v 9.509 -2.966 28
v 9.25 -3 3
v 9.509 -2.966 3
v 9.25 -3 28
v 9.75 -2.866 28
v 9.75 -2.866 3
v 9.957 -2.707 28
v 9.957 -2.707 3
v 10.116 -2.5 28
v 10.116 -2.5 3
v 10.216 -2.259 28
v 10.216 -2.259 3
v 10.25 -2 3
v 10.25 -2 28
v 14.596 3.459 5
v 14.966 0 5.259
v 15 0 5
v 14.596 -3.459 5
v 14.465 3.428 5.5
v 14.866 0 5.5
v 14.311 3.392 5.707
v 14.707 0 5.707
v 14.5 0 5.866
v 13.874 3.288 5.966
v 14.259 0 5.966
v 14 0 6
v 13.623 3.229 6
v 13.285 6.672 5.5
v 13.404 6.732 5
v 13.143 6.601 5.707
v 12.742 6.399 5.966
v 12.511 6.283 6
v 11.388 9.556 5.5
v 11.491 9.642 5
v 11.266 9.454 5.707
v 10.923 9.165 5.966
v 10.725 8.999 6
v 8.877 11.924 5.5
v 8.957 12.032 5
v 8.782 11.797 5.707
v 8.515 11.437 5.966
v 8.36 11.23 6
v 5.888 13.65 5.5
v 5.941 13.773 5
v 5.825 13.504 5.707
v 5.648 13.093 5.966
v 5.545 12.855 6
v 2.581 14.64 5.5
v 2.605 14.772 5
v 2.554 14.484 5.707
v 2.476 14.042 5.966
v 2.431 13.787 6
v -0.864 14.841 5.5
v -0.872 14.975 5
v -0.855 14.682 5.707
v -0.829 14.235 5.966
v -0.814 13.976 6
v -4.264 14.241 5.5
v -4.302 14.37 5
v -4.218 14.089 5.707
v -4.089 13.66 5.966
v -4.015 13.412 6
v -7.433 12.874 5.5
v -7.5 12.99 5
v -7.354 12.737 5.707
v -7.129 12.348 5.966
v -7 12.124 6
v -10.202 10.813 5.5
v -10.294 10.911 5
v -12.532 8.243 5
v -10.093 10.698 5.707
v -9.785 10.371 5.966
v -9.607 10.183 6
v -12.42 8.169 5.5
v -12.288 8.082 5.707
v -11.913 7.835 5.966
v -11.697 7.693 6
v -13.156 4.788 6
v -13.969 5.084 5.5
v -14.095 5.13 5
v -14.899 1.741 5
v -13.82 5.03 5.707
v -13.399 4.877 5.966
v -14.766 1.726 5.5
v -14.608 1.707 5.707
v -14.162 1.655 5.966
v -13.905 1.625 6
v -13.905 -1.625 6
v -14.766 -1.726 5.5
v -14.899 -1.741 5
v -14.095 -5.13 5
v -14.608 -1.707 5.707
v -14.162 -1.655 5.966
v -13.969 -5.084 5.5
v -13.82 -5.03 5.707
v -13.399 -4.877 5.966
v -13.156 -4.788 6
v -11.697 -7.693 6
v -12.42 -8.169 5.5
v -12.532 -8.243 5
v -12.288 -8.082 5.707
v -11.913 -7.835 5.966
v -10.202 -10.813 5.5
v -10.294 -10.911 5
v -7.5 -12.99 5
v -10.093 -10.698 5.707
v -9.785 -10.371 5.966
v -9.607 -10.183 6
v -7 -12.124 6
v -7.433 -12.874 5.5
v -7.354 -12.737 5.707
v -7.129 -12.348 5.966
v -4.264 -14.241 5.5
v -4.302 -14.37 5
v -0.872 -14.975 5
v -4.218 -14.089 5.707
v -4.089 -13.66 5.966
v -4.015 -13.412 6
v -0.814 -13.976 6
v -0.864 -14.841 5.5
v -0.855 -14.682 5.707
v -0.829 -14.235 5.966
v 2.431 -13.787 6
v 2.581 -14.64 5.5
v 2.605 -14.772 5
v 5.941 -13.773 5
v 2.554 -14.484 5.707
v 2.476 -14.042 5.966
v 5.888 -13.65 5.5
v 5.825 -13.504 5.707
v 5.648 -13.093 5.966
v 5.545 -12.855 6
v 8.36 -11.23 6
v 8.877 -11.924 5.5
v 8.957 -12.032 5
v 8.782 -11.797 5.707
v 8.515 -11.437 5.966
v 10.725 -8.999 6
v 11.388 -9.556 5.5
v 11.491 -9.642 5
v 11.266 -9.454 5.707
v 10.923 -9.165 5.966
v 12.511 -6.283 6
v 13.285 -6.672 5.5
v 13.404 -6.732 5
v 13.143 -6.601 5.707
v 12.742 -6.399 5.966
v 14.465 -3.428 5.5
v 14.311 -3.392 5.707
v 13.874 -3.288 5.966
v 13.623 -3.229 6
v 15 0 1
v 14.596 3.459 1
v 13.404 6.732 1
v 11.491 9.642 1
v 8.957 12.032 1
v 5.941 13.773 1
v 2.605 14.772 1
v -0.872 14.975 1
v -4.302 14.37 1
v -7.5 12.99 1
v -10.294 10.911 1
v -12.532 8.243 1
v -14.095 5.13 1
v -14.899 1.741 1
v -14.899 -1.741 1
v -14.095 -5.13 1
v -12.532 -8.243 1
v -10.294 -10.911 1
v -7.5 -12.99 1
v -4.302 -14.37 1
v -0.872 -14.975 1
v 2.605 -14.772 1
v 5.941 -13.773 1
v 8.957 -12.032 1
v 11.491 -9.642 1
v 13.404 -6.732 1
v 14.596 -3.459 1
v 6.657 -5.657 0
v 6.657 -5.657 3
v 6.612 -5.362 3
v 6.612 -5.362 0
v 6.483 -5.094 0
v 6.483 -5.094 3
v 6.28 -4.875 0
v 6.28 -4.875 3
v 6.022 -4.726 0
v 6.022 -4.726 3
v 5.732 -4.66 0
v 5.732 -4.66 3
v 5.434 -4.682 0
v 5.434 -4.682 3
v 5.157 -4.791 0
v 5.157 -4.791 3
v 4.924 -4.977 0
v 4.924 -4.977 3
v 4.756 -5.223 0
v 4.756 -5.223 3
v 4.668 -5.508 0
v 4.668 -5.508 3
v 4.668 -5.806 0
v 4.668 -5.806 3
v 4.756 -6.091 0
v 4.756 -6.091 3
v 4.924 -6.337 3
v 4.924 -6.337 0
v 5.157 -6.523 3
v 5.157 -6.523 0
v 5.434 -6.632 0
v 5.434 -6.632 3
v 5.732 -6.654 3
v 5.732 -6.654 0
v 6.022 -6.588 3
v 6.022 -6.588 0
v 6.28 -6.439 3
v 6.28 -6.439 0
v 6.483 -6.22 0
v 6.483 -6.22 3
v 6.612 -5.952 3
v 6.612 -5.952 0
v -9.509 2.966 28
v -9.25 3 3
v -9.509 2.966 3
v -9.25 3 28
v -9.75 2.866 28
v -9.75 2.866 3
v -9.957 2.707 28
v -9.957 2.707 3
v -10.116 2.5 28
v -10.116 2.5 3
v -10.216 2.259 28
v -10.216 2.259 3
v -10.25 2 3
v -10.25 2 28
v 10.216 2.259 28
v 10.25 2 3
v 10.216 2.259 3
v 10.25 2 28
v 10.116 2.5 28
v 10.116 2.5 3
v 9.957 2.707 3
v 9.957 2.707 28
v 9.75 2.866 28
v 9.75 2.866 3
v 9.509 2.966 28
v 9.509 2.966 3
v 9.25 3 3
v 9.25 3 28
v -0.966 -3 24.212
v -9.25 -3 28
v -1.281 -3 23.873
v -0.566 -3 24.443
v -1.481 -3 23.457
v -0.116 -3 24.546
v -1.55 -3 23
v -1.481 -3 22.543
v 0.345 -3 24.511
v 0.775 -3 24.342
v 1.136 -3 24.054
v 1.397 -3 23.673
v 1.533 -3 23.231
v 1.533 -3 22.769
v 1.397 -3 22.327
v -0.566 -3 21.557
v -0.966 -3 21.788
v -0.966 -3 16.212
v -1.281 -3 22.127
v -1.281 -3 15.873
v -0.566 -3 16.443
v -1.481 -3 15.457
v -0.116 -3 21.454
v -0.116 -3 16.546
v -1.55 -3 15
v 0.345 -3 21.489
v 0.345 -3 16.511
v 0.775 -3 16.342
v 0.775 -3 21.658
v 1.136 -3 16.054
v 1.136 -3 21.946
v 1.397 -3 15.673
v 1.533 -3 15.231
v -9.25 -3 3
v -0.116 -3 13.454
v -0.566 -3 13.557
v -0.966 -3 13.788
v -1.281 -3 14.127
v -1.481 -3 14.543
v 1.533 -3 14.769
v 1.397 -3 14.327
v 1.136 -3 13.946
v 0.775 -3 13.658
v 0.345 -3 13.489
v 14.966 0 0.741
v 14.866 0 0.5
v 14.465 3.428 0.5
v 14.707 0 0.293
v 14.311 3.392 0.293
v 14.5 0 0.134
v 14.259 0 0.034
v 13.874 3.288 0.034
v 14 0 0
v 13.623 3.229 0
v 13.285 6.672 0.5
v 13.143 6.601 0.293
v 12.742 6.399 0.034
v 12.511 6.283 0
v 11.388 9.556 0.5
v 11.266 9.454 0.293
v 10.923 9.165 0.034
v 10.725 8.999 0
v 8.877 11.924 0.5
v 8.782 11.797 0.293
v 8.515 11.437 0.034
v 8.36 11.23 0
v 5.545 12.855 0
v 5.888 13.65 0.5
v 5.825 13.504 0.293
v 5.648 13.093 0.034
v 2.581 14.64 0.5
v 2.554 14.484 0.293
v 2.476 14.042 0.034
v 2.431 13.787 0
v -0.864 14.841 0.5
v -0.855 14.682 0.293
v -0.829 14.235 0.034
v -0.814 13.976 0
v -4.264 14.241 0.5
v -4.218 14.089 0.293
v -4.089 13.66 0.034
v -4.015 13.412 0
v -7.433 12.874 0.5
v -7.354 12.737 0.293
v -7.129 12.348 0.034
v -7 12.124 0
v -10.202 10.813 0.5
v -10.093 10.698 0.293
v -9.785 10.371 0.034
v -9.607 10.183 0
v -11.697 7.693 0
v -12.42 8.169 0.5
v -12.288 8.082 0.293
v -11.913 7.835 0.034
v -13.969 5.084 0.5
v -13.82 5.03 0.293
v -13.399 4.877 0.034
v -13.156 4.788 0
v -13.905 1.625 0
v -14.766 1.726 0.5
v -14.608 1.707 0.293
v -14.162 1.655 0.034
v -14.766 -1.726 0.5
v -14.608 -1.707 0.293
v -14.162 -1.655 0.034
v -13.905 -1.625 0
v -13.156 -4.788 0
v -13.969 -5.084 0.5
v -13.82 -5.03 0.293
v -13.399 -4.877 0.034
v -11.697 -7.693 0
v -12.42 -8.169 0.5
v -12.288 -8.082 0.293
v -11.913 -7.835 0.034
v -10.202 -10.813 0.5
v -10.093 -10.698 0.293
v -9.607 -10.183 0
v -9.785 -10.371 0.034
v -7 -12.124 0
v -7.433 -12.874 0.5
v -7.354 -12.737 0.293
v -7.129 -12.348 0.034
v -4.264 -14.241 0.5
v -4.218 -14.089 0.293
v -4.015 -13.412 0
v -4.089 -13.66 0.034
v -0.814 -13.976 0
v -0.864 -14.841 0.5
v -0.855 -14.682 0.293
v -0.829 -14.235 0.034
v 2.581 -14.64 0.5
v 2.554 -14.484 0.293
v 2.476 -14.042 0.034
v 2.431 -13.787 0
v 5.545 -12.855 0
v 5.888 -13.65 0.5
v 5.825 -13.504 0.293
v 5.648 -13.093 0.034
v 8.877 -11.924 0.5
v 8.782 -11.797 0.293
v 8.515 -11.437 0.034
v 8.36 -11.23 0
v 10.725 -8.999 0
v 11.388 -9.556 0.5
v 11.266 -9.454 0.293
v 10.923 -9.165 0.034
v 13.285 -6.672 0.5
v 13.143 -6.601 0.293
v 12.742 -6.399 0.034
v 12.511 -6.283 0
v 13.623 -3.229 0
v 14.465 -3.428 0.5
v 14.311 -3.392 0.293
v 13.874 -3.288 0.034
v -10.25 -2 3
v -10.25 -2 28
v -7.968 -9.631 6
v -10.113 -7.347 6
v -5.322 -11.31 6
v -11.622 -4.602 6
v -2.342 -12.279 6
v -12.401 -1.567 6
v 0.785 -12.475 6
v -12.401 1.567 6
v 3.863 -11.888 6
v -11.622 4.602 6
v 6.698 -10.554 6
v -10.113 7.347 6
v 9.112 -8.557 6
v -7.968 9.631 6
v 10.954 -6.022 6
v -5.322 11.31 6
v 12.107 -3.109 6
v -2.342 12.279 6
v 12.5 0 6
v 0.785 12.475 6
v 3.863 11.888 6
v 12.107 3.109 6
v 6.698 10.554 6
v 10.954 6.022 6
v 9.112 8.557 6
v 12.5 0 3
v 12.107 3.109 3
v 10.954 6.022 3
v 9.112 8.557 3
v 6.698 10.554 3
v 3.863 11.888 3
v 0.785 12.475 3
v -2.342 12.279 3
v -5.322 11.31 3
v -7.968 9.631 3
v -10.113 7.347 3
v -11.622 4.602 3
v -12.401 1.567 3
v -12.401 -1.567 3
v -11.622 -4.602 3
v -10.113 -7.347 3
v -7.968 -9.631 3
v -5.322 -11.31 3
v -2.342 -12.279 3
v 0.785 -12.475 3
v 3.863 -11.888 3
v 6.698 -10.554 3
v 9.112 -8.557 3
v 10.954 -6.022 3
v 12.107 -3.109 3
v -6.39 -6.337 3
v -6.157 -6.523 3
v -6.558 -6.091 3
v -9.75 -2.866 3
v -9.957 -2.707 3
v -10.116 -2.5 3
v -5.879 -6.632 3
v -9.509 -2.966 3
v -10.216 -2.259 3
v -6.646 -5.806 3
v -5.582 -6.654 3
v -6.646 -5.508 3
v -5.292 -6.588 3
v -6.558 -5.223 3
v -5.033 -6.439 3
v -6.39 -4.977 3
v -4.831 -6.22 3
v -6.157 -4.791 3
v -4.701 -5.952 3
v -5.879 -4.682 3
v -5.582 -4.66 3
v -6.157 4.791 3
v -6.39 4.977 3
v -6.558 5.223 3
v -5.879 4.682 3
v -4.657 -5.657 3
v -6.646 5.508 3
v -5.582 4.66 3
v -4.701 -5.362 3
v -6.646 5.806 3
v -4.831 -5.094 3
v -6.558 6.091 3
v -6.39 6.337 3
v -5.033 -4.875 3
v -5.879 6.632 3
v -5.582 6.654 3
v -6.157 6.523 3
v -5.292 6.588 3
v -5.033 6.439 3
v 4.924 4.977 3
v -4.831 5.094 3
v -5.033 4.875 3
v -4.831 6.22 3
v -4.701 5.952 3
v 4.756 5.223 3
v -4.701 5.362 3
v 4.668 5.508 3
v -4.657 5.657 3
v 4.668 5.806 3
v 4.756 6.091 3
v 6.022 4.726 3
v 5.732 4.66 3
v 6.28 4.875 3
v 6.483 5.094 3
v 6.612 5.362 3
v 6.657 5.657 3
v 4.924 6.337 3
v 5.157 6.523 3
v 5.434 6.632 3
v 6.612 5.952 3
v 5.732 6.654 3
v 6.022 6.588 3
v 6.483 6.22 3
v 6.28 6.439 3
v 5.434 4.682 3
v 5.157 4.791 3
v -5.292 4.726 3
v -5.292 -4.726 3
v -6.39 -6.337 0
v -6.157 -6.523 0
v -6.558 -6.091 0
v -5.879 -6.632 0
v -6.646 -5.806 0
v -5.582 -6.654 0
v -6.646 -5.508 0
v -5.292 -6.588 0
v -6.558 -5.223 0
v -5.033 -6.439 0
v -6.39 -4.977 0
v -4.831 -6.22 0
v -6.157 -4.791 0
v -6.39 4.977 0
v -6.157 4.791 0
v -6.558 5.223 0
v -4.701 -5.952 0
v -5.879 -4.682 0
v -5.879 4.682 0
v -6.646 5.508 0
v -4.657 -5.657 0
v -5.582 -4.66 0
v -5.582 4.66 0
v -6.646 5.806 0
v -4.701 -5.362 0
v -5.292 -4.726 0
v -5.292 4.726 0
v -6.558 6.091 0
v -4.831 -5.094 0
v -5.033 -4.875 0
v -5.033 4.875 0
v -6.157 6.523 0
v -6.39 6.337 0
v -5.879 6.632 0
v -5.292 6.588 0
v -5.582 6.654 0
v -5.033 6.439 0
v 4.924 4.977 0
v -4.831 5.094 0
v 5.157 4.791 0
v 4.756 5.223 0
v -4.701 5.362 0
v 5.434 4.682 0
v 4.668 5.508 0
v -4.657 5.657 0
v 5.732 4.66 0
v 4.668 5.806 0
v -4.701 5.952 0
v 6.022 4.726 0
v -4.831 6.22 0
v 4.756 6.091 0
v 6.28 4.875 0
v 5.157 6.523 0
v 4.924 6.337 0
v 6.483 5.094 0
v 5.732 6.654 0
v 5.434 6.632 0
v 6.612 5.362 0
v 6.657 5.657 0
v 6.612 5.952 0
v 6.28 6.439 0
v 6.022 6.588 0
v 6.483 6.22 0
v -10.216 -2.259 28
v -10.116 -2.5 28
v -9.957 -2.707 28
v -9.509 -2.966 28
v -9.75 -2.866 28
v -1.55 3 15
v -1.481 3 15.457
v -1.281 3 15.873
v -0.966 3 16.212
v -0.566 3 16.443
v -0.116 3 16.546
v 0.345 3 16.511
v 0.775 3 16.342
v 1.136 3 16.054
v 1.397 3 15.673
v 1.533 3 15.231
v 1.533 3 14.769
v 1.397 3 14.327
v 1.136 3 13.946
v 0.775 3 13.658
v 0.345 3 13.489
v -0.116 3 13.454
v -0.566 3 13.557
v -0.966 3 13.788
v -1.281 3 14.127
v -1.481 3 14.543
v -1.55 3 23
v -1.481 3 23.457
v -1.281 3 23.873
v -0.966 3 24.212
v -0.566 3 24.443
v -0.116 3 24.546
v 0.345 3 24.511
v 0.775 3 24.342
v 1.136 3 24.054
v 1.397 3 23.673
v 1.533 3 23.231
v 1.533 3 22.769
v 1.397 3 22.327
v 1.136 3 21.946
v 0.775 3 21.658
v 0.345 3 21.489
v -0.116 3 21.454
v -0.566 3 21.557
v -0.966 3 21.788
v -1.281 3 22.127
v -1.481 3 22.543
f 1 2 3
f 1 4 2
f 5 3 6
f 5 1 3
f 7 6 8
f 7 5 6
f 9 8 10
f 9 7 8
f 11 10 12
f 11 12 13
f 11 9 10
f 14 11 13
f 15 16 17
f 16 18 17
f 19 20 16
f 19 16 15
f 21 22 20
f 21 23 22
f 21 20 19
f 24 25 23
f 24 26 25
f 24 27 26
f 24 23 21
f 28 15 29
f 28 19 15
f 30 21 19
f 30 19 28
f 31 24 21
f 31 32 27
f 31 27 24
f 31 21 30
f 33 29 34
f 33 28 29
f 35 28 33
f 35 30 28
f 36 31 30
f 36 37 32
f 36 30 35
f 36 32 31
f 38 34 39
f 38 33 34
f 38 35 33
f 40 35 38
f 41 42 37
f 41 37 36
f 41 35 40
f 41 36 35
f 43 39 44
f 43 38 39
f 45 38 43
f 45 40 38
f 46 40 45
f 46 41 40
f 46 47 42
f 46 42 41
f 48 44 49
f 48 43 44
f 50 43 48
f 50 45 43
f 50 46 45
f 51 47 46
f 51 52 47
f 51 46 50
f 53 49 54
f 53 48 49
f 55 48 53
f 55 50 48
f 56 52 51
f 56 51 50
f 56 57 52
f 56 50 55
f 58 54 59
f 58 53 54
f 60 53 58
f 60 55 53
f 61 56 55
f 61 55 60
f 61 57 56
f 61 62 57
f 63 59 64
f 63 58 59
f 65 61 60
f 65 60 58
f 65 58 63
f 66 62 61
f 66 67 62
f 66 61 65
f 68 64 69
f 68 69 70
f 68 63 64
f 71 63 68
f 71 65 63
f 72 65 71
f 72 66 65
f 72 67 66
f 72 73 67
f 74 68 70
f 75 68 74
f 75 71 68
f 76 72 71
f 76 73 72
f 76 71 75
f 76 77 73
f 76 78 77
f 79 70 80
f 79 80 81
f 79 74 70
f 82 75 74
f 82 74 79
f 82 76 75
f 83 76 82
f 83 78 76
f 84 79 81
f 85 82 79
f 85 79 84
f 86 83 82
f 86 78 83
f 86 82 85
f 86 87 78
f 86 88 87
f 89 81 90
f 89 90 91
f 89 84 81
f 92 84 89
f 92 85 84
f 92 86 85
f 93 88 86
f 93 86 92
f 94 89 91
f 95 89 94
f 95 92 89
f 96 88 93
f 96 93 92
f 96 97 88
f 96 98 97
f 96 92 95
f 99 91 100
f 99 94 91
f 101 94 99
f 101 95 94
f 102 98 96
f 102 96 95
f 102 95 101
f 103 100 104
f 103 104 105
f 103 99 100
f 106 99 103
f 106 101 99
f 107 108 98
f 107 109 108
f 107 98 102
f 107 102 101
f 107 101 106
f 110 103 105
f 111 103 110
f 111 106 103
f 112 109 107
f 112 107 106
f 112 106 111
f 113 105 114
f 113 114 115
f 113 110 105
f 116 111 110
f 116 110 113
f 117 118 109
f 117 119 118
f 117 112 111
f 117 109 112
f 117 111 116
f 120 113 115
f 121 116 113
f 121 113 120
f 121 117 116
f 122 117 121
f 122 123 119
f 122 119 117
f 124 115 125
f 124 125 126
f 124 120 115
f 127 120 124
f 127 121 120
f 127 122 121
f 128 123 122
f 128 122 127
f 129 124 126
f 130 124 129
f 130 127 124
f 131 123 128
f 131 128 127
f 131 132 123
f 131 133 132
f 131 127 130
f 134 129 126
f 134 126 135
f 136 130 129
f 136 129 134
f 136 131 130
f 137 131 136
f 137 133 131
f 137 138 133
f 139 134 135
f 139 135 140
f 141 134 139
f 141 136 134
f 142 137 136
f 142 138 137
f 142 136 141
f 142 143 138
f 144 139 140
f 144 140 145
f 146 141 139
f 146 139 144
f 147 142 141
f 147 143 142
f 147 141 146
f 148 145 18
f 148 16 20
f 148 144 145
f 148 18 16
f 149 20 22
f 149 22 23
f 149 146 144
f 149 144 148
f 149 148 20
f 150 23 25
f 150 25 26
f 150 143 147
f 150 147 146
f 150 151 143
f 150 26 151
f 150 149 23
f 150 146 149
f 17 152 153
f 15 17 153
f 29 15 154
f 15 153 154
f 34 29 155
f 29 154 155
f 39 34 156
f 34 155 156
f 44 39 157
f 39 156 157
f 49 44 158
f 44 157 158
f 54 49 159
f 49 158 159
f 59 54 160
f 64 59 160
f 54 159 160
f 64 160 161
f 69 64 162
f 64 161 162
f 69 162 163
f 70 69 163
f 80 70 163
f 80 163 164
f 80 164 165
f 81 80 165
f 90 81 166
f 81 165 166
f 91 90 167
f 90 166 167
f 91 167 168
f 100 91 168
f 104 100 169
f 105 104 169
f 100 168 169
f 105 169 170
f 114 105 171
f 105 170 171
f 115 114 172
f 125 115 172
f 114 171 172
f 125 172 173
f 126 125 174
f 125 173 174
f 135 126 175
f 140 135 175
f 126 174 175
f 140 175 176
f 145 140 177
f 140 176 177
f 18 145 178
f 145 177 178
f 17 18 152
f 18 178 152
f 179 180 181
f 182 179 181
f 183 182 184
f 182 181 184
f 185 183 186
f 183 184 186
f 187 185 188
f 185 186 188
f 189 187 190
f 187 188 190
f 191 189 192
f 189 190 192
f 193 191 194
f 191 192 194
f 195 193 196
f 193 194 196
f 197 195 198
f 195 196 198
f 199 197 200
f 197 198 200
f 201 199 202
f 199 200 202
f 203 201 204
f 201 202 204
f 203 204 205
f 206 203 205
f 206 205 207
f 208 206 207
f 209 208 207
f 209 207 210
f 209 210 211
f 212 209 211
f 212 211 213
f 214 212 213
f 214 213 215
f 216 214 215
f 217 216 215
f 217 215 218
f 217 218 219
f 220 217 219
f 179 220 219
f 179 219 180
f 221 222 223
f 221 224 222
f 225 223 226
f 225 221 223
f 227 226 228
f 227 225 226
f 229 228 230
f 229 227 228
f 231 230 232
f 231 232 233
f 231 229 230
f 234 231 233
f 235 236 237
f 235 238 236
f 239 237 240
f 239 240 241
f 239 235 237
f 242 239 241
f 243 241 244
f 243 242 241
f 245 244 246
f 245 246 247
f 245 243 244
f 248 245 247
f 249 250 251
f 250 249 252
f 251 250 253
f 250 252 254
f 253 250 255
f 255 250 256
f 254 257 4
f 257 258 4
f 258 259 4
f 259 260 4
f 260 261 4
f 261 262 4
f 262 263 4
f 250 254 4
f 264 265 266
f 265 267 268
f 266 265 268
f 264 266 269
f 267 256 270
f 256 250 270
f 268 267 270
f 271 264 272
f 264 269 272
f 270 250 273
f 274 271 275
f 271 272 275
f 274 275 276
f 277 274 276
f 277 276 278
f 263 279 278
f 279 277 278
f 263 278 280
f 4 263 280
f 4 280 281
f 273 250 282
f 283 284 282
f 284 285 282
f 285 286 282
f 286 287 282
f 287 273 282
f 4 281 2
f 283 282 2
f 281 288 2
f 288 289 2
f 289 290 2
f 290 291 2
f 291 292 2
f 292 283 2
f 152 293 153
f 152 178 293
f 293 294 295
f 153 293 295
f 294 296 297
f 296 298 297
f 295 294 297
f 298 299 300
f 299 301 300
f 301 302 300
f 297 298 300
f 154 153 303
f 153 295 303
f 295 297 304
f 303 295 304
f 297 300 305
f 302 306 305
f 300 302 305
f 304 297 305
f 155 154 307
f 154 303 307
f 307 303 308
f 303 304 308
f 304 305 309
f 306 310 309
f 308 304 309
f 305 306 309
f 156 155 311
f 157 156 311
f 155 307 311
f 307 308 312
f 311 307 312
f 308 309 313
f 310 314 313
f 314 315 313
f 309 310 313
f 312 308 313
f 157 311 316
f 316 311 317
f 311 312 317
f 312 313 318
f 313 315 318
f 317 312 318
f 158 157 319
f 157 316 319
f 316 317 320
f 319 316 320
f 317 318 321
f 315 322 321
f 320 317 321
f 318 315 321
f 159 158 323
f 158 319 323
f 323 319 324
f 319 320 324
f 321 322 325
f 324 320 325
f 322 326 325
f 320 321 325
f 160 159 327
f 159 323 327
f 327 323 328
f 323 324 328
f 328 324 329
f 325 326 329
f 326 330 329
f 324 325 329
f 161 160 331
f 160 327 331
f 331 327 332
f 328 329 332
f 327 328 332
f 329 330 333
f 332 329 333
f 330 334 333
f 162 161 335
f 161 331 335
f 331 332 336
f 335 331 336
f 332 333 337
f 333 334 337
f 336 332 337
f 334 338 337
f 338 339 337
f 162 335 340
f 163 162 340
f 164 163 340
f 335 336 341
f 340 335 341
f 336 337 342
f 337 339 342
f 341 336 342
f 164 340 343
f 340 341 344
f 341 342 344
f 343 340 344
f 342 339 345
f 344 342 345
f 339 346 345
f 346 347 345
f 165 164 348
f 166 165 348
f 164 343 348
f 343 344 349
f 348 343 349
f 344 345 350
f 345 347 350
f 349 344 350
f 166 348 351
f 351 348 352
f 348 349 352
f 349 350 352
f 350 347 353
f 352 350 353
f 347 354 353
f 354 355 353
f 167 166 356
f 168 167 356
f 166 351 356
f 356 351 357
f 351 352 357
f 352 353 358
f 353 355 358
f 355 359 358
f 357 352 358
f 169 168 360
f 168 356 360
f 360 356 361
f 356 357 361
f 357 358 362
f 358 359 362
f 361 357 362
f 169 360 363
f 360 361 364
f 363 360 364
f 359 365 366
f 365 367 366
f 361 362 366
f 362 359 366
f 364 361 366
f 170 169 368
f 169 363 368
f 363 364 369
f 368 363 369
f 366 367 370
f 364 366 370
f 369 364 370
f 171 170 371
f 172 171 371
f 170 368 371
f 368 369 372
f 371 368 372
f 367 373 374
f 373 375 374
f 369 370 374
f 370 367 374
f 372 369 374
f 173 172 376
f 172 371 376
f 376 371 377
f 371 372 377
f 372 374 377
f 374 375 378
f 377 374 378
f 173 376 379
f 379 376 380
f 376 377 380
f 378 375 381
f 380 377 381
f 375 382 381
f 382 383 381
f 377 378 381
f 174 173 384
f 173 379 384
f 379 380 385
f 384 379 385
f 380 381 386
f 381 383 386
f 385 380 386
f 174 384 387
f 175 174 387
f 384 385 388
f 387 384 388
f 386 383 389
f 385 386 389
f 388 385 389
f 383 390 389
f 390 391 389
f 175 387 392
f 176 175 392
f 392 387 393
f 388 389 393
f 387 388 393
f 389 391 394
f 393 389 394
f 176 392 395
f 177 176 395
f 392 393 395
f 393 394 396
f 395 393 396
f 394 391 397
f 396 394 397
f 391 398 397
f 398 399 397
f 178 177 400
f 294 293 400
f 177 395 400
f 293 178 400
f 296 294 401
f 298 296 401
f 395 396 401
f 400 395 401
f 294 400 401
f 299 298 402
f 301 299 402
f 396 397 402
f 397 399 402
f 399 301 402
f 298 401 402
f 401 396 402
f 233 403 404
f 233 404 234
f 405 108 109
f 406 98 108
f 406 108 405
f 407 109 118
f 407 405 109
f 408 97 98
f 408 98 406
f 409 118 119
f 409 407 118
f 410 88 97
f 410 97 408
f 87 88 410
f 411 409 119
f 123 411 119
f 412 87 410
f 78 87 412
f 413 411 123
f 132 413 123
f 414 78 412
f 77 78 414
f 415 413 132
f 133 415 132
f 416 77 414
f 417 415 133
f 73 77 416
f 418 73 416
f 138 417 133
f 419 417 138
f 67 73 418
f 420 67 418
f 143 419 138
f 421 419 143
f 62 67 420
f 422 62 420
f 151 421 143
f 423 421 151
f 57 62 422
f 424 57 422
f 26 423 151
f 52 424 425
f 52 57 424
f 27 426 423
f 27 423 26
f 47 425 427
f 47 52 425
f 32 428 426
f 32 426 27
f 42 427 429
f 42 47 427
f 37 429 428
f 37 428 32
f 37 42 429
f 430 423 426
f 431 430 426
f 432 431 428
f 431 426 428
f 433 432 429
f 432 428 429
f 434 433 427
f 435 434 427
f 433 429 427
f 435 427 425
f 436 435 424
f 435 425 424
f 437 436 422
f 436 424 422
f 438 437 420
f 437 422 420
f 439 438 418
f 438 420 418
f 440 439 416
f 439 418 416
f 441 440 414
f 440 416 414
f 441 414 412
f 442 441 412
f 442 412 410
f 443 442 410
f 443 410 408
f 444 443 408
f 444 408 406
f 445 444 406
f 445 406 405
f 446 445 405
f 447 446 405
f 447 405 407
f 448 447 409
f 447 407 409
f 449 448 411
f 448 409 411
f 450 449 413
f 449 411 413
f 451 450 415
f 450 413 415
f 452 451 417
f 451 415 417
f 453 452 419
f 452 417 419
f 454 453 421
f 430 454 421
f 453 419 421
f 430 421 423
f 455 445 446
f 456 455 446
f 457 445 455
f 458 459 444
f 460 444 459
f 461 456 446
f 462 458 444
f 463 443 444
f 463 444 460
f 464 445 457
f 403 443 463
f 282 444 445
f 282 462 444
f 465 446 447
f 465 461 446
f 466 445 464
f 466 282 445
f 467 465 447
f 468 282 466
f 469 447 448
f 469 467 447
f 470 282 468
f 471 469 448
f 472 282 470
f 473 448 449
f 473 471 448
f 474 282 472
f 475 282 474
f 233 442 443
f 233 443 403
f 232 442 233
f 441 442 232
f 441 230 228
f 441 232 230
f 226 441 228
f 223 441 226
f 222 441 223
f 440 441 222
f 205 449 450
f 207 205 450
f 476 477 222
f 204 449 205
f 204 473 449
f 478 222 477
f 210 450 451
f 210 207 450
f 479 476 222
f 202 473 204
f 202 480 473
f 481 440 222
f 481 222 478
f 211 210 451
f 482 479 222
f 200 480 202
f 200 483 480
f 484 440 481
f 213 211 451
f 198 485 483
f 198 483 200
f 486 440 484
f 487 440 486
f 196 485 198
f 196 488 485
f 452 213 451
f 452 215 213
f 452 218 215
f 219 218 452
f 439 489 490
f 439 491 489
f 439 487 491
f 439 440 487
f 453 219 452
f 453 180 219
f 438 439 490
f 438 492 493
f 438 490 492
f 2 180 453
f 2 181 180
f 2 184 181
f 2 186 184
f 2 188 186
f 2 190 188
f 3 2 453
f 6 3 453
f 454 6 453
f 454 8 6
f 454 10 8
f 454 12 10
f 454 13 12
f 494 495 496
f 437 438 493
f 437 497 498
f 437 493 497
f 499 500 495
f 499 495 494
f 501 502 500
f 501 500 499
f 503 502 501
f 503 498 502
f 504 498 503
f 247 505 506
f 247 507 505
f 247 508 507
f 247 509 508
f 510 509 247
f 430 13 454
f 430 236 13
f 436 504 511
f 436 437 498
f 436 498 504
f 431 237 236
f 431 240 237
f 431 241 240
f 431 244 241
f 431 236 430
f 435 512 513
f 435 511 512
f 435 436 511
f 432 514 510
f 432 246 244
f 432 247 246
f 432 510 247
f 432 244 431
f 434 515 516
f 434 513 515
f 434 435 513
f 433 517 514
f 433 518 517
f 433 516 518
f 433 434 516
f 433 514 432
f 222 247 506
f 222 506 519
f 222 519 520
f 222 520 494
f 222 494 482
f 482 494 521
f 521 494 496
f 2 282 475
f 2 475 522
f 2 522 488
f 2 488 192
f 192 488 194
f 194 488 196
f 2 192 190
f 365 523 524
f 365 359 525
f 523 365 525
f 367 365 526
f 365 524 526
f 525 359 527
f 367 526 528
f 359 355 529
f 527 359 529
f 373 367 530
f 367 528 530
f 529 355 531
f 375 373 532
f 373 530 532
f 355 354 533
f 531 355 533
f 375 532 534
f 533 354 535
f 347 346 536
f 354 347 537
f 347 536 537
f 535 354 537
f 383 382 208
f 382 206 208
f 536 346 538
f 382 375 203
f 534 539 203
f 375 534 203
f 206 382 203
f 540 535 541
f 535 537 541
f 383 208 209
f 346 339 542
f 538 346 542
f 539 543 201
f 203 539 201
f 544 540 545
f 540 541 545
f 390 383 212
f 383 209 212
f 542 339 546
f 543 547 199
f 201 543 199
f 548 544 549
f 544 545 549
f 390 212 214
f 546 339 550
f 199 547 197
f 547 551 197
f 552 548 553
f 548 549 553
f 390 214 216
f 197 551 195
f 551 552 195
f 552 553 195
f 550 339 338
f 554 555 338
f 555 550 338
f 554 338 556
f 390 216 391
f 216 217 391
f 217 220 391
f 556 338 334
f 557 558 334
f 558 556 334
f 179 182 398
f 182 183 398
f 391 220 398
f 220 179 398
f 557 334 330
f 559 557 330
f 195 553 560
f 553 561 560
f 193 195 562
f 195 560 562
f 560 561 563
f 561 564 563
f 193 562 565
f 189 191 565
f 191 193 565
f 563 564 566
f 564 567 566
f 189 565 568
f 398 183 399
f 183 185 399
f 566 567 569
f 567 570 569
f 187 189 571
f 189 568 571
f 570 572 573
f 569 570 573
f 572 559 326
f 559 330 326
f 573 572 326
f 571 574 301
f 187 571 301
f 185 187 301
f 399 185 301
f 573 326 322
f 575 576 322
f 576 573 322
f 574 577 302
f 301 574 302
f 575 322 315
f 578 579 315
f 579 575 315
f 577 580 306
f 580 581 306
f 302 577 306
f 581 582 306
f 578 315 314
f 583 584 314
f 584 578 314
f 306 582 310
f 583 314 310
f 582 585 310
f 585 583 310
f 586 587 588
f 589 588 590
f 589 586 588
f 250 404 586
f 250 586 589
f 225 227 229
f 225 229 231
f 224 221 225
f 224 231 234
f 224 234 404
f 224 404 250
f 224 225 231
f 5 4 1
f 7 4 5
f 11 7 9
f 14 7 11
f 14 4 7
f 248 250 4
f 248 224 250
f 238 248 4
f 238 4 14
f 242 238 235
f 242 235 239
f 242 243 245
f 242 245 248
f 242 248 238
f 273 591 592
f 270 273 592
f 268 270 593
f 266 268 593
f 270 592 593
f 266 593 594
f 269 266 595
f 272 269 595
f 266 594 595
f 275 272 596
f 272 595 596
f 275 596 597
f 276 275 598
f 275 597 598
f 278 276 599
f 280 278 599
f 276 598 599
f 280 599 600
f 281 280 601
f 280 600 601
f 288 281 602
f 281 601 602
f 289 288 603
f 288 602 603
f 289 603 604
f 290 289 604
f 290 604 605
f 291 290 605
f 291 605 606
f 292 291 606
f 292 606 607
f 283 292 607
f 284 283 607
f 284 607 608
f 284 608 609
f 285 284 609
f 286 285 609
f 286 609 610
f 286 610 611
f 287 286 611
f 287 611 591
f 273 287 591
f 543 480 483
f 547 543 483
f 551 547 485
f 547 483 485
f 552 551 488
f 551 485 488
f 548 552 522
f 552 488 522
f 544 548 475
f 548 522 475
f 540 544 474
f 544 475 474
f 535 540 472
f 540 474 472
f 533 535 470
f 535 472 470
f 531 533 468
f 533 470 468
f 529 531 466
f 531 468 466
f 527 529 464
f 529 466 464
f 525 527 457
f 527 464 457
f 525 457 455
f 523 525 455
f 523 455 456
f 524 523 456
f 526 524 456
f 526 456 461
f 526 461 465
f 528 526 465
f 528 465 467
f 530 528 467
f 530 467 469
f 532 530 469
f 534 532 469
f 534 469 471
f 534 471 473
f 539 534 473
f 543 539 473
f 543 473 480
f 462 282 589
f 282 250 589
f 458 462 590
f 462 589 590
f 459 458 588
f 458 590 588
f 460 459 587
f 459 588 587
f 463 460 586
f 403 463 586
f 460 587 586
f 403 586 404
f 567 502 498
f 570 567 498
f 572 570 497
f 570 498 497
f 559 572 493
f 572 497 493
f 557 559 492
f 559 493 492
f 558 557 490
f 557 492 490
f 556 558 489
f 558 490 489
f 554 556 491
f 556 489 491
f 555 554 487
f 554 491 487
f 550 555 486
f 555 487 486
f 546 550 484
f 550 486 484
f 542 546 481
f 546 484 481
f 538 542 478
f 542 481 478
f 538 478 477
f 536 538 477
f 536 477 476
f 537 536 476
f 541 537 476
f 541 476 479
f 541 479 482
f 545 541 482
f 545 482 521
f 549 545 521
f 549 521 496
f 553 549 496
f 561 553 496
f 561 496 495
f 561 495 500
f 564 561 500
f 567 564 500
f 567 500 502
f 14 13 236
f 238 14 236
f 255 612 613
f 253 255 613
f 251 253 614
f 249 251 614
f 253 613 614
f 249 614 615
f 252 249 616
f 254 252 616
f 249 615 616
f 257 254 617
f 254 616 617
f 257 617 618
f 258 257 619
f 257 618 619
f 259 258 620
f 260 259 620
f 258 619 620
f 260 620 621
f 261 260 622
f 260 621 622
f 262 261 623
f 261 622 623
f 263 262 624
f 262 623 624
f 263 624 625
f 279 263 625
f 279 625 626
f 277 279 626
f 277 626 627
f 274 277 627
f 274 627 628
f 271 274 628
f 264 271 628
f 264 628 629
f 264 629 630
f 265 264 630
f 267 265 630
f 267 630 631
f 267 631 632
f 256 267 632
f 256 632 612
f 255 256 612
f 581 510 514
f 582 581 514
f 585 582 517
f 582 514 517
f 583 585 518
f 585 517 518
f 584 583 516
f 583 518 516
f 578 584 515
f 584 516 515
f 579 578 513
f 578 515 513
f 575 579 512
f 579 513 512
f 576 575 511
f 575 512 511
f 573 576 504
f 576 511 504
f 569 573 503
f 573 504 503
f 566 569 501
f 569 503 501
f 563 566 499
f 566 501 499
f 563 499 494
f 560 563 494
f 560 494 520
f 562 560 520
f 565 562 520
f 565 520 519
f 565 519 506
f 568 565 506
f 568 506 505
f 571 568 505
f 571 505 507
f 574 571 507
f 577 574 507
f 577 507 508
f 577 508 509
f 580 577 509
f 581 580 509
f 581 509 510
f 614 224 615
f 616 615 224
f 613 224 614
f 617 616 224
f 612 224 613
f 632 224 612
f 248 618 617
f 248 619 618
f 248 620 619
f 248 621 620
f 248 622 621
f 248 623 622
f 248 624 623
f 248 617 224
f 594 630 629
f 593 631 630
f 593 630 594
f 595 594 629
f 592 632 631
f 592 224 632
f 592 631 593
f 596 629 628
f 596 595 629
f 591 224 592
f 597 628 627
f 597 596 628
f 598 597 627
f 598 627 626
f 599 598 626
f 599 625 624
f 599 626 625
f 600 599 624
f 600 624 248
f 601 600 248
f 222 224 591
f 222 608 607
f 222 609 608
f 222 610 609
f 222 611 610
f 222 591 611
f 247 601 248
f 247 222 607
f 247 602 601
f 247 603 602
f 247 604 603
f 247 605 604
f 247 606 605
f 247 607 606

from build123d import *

# Parameters (mm, degrees)
SKETCH_R        = 15
PAD_DEPTH       = 6
FILLET_R        = 1
FILLET001_R     = 1
SKETCH001_R     = 12.5
POCKET_DEPTH    = 3
SKETCH002_W     = 20.5
SKETCH002_H     = 6
PAD001_DEPTH    = 25
SKETCH003_R     = 1.55
POCKET001_DEPTH = 20
SKETCH004_R     = 1
POCKET002_DEPTH = 6
FILLET002_R     = 1
FILLET003_R     = 1
FILLET004_R     = 1
FILLET005_R     = 1


with BuildPart() as part:
    # Sketch → Pad (new body)
    with BuildSketch(Plane.XY):
        Circle(SKETCH_R)
    extrude(amount=PAD_DEPTH)

    # Fillet
    fillet_edges = [part.edges().sort_by_distance(p)[0] for p in [
        (-15, 0, 0),
    ]]
    fillet(fillet_edges, radius=FILLET_R)

    # Fillet001
    fillet001_edges = [part.edges().sort_by_distance(p)[0] for p in [
        (-15, 0, 6),
    ]]
    fillet(fillet001_edges, radius=FILLET001_R)

    # Sketch001 (on Face4 of Fillet001) → Pocket (cut)
    with BuildSketch(Plane.XY.offset(6)):
        Circle(SKETCH001_R)
    extrude(amount=-POCKET_DEPTH, mode=Mode.SUBTRACT)

    # Sketch002 (on Face7 of Pocket) → Pad001 (join)
    with BuildSketch(Plane.XY.offset(3)):
        Rectangle(SKETCH002_W, SKETCH002_H)
    extrude(amount=PAD001_DEPTH)

    # Sketch003 (on Face11 of Pad001) → Pocket001 (cut)
    with BuildSketch(Plane(origin=(0, 3, 0), x_dir=(-1, 0, 0), z_dir=(0, 1, 0))):
        with Locations((0, 23)):
            Circle(SKETCH003_R)
        with Locations((0, 15)):
            Circle(SKETCH003_R)
    extrude(amount=-POCKET001_DEPTH, mode=Mode.SUBTRACT)

    # Sketch004 (on Face3 of Pad) → Pocket002 (cut)
    with BuildSketch(Plane.XY.offset(6)):
        with Locations((-5.656854, 5.656854)):
            Circle(SKETCH004_R)
        with Locations((5.656854, 5.656854)):
            Circle(SKETCH004_R)
        with Locations((-5.656854, -5.656854)):
            Circle(SKETCH004_R)
        with Locations((5.656854, -5.656854)):
            Circle(SKETCH004_R)
    extrude(amount=-POCKET002_DEPTH, mode=Mode.SUBTRACT)

    # Fillet002
    fillet002_edges = [part.edges().sort_by_distance(p)[0] for p in [
        (-10.25, -3, 15.5),
    ]]
    fillet(fillet002_edges, radius=FILLET002_R)

    # Fillet003
    fillet003_edges = [part.edges().sort_by_distance(p)[0] for p in [
        (10.25, -3, 15.5),
    ]]
    fillet(fillet003_edges, radius=FILLET003_R)

    # Fillet004
    fillet004_edges = [part.edges().sort_by_distance(p)[0] for p in [
        (10.25, 3, 15.5),
    ]]
    fillet(fillet004_edges, radius=FILLET004_R)

    # Fillet005
    fillet005_edges = [part.edges().sort_by_distance(p)[0] for p in [
        (-10.25, 3, 15.5),
    ]]
    fillet(fillet005_edges, radius=FILLET005_R)


solid = part.part
